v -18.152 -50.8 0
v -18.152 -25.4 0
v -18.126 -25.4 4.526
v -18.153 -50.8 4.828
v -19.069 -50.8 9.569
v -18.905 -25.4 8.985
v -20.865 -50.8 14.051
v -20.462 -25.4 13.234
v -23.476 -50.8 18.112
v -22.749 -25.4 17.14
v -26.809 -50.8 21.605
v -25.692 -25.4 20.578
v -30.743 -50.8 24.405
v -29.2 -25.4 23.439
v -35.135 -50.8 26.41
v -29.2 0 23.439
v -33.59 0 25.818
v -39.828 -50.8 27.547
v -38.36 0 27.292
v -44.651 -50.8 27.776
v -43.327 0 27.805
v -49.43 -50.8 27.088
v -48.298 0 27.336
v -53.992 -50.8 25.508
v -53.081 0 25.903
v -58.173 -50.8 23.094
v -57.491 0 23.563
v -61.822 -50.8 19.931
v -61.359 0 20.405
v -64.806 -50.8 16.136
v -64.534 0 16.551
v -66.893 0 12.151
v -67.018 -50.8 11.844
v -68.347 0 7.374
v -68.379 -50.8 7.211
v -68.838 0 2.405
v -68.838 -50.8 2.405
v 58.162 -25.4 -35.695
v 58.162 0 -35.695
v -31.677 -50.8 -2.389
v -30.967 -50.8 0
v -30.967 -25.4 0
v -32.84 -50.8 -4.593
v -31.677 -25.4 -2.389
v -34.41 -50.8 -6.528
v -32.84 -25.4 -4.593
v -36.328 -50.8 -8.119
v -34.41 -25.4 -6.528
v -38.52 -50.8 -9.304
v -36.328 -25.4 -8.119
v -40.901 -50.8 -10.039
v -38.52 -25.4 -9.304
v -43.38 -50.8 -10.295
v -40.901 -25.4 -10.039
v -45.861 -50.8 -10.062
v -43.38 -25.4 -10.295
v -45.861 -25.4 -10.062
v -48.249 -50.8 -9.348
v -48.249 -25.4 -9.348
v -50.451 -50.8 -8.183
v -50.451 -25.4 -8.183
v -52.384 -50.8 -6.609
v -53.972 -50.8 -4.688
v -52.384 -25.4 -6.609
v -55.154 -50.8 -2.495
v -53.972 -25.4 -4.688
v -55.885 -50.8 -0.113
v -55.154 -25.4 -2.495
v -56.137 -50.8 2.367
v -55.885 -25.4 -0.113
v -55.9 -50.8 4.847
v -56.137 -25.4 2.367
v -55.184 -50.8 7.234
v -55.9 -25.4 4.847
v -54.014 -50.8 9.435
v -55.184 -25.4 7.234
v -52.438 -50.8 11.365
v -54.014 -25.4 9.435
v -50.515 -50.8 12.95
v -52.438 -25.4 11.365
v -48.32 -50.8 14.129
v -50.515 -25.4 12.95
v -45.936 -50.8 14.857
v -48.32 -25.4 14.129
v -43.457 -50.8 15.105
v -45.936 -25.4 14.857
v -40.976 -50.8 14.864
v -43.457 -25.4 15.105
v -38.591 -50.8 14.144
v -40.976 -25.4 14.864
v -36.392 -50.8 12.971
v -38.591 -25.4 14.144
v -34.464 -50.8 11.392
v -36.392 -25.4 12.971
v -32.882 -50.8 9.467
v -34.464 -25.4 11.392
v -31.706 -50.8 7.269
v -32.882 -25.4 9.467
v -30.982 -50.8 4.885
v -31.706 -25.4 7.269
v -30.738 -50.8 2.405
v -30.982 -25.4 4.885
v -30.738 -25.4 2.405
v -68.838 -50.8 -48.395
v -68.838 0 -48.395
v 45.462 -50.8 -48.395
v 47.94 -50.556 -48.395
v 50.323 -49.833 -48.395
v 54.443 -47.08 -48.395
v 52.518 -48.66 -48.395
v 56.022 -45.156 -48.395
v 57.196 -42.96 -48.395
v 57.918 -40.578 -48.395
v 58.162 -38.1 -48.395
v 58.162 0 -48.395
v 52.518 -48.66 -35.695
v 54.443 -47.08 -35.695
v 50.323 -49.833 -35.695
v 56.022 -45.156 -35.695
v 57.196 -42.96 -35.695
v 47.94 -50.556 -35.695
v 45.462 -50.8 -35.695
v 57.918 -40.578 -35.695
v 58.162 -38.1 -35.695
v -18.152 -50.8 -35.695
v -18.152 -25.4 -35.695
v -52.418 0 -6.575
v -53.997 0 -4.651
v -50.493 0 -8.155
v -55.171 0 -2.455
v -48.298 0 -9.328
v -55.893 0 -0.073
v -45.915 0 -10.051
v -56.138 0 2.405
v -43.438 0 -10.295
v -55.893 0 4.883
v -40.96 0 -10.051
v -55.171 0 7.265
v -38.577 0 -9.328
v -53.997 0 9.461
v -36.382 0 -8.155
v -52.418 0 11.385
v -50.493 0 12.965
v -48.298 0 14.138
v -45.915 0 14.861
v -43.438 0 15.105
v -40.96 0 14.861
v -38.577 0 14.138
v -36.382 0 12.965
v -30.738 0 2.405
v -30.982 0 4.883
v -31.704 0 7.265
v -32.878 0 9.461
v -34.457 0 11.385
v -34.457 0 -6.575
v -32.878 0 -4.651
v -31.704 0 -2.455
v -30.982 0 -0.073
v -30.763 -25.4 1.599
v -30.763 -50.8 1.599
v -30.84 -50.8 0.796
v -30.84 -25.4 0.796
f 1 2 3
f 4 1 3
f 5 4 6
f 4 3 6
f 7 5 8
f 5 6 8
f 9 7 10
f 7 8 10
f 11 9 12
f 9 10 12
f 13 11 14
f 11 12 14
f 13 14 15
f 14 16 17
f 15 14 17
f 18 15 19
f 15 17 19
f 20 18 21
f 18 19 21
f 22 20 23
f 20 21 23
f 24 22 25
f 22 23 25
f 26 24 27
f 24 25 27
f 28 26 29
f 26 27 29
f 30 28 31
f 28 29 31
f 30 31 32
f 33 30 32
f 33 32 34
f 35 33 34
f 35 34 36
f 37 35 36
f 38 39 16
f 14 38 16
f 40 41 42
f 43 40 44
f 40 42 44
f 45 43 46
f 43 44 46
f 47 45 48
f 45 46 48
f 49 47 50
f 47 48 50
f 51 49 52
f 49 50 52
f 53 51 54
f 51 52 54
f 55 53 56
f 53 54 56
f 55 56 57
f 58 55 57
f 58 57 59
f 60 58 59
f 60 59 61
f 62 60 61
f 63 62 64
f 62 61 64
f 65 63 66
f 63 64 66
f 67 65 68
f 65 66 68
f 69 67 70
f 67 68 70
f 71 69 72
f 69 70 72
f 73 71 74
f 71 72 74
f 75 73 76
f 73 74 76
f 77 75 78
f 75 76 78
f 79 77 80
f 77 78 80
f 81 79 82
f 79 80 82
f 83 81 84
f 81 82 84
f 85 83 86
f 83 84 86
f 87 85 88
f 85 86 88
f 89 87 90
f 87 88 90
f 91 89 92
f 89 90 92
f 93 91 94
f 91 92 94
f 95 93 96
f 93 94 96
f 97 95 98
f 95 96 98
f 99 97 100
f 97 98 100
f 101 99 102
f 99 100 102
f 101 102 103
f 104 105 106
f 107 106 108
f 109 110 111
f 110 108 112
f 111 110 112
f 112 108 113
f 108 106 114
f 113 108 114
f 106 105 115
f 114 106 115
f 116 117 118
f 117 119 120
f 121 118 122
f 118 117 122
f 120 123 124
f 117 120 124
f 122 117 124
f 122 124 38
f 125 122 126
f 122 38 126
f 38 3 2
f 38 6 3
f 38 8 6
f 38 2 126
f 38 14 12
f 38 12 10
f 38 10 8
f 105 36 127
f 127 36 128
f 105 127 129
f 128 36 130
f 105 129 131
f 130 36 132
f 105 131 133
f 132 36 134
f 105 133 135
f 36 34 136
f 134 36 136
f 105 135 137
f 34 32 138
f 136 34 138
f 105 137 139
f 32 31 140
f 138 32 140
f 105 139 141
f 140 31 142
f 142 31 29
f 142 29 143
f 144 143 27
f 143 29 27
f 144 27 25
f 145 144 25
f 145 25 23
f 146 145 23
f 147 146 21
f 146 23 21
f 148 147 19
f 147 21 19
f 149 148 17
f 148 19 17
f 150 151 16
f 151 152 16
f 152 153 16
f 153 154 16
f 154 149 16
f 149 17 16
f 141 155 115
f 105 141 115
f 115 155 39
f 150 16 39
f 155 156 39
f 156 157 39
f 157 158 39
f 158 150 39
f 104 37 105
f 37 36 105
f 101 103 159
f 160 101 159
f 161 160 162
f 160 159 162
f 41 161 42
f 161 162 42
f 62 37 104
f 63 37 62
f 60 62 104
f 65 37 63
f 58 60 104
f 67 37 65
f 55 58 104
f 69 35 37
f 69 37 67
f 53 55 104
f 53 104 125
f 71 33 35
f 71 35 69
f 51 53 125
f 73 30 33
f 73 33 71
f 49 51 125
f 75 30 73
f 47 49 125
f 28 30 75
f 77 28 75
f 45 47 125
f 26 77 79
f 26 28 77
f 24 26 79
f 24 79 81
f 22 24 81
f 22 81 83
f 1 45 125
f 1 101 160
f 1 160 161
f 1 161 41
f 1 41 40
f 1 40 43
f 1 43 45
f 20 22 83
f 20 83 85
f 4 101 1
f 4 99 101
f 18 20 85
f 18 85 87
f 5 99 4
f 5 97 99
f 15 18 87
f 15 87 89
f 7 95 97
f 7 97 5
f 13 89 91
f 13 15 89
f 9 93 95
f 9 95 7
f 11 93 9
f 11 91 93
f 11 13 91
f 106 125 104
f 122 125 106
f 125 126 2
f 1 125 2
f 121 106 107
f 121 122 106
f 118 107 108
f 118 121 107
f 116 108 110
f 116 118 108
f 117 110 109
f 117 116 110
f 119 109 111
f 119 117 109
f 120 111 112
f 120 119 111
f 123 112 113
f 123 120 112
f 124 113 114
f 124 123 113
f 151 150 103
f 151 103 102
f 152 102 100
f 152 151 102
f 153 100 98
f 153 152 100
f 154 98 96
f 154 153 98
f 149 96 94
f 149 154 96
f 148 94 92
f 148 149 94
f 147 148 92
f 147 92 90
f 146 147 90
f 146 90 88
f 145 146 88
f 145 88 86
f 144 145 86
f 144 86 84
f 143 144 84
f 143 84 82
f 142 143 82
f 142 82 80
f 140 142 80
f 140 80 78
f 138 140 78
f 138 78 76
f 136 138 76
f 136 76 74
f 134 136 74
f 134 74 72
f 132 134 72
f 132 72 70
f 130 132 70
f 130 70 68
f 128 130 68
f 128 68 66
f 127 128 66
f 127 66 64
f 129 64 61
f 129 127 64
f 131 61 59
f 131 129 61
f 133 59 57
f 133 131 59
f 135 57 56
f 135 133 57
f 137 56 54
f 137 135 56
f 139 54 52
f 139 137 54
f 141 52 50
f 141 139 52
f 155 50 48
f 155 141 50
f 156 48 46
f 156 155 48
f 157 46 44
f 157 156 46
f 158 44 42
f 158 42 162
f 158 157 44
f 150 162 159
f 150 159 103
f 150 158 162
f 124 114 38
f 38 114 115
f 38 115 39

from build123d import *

# Parameters (mm, degrees)
F0_R     = 12.7
F1_DEPTH = 25.4
F3_DEPTH = 25.4
F4_R     = 12.7


with BuildPart() as f1:
    # F0 (on Front) → F1 (new body)
    with BuildSketch(Plane.XZ):
        with BuildLine():
            Line((58.1624929965, -35.6950488269), (-29.1996338754, 23.4392795148))
            ThreePointArc((-29.1996338754, 23.4392795148), (-55.3437663352, 24.841550486), (-68.8375070035, 2.4049511731))
            Line((-68.8375070035, 2.4049511731), (-68.8375070035, -48.3950488269))
            Line((-68.8375070035, -48.3950488269), (58.1624929965, -48.3950488269))
            Line((58.1624929965, -48.3950488269), (58.1624929965, -35.6950488269))
        make_face()
        with Locations((-43.4375070035, 2.4049511731)):
            Circle(F0_R, mode=Mode.SUBTRACT)
    extrude(amount=F1_DEPTH)

    # F2 (on face) → F3 (join)
    with BuildSketch(Plane.XZ.offset(25.4)):
        with BuildLine():
            Line((-18.151617463, -35.6950488269), (-18.151617463, 0))
            ThreePointArc((-18.151617463, 0), (-20.4618261667, 13.2344520888), (-29.1996338754, 23.4392795148))
            ThreePointArc((-29.1996338754, 23.4392795148), (-55.3437663352, 24.841550486), (-68.8375070035, 2.4049511731))
            Line((-68.8375070035, 2.4049511731), (-68.8375070035, -35.6950488269))
            Line((-68.8375070035, -35.6950488269), (-68.8375070035, -48.3950488269))
            Line((-68.8375070035, -48.3950488269), (58.1624929965, -48.3950488269))
            Line((58.1624929965, -48.3950488269), (58.1624929965, -35.6950488269))
            Line((58.1624929965, -35.6950488269), (-18.151617463, -35.6950488269))
        make_face()
        with BuildLine():
            ThreePointArc((-30.9672941002, 0), (-56.0799297119, 3.6129031852), (-30.7375070035, 2.4049511731))
            ThreePointArc((-30.7375070035, 2.4049511731), (-30.7950842952, 1.1969991609), (-30.9672941002, 0))
        make_face(mode=Mode.SUBTRACT)
    extrude(amount=F3_DEPTH)

    # F4
    f4_edges = [f1.edges().sort_by_distance(p)[0] for p in [
        (58.162493, -50.8, -42.045049),
    ]]
    fillet(f4_edges, radius=F4_R)


solid = f1.part
